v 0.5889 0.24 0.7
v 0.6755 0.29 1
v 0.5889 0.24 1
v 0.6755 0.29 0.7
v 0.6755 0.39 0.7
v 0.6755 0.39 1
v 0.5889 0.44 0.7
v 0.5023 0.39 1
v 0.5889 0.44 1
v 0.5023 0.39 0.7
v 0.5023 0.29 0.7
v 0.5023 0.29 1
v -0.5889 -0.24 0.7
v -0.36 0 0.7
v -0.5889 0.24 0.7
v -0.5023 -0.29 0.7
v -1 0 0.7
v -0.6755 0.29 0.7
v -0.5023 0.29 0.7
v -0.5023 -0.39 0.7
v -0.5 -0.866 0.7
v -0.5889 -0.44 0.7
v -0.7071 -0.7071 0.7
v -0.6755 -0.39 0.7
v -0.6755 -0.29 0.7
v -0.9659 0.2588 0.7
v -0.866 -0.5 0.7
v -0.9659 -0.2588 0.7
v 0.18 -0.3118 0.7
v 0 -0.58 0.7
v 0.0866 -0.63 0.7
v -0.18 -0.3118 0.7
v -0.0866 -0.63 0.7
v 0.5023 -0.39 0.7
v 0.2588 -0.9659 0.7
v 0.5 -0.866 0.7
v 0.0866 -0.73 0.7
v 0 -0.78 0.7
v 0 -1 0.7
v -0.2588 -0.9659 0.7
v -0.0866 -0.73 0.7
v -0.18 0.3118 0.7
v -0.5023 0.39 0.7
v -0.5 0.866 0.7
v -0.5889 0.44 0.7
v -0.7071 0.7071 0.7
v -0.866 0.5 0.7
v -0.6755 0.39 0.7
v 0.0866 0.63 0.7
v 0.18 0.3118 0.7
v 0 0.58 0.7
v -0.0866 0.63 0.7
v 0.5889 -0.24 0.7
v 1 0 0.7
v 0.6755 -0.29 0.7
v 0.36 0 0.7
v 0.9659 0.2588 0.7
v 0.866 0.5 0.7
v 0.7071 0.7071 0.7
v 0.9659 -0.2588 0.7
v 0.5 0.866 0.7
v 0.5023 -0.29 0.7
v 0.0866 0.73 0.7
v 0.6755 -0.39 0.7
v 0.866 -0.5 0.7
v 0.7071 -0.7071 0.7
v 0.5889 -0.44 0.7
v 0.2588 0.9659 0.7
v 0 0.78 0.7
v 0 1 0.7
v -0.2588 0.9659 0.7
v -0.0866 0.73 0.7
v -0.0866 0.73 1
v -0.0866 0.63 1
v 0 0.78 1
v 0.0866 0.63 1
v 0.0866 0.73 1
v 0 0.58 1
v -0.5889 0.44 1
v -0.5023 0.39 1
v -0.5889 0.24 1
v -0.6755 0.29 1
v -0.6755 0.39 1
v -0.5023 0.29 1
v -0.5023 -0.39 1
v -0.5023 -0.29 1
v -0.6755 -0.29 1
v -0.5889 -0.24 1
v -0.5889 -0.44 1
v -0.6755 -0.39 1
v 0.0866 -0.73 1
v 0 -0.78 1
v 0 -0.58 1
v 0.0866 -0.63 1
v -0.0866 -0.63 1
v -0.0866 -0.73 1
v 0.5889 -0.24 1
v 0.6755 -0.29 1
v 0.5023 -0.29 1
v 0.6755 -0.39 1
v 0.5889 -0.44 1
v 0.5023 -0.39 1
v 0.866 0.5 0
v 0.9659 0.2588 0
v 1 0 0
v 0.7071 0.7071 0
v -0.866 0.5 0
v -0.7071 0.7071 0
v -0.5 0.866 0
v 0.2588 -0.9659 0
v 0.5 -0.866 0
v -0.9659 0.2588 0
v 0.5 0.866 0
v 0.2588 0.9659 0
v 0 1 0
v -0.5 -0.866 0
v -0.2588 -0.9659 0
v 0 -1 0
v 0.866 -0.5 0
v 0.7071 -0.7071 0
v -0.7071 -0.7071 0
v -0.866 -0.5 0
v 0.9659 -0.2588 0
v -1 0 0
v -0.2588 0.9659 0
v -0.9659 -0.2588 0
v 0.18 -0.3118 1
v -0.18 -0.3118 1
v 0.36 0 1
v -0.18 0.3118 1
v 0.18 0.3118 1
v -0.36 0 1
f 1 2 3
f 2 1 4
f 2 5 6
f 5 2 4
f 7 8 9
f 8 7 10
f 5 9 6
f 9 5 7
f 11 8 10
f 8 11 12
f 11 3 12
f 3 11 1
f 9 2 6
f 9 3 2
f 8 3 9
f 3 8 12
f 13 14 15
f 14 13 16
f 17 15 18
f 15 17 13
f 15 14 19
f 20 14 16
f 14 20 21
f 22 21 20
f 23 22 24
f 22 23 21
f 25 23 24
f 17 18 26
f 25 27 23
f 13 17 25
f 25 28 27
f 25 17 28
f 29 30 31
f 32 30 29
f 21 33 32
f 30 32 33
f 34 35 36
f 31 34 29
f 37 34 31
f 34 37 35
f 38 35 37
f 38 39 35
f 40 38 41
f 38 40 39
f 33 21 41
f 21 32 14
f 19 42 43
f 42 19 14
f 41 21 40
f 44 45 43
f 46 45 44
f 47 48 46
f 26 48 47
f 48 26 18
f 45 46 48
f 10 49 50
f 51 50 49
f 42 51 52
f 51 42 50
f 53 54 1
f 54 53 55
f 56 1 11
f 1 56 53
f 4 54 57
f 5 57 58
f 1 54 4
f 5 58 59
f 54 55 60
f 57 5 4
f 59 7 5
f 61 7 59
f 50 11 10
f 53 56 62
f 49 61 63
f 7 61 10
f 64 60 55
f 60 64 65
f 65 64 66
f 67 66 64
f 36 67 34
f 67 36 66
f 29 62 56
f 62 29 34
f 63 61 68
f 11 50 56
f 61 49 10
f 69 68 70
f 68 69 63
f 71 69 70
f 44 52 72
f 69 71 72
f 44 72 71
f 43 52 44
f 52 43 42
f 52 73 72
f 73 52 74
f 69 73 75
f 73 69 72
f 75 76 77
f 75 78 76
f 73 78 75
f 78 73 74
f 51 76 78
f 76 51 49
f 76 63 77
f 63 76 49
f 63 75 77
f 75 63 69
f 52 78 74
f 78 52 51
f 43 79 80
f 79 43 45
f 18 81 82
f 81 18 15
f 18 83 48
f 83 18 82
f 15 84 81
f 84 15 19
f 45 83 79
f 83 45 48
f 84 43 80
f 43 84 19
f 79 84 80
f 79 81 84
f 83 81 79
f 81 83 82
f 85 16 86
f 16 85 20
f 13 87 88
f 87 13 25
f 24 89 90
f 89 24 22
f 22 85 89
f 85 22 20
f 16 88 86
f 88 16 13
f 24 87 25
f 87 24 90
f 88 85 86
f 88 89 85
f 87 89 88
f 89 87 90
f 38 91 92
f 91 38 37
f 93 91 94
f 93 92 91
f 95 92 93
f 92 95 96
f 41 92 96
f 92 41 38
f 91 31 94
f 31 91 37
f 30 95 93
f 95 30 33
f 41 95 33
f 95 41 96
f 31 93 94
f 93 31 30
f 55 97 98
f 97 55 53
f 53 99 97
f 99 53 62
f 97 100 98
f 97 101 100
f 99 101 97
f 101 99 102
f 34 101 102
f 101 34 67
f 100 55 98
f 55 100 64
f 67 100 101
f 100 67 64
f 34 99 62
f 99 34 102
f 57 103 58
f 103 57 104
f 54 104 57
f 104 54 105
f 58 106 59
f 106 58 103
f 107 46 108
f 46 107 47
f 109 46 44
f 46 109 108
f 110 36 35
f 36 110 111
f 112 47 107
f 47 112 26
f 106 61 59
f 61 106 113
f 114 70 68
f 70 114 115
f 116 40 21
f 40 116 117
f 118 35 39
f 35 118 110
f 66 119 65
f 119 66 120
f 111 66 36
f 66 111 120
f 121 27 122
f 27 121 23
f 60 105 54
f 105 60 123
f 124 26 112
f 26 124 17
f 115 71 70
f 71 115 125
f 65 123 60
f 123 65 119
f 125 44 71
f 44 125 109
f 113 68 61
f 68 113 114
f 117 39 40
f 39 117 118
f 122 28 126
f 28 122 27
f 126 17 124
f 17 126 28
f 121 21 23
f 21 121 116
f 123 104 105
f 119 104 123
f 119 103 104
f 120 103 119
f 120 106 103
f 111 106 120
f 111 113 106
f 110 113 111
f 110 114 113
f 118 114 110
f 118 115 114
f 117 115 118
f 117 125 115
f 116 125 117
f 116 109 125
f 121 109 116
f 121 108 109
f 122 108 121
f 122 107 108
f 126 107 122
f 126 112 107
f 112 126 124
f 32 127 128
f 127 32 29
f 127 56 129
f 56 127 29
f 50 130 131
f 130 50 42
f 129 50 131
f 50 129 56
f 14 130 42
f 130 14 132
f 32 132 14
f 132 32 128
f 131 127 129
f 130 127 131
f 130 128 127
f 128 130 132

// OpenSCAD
// Carousel Autoloader 0.2.23 - drum end-plate hub (naaf) on unit radius; z from 0 (inside) to 1 (outer face).
// The hub disc fills the plate centre up to z = 0.7 (flush with the holed plate), six bolt heads and the
// axle nut stand proud up to z = 1. The C# geometry scales x/y by the hub radius and z by the plate thickness.
cylinder(r = 1, h = 0.7, $fn = 24);
for (i = [0:5]) rotate([0, 0, 30 + 60 * i]) translate([0.68, 0, 0.7]) cylinder(r = 0.1, h = 0.3, $fn = 6);
translate([0, 0, 0.7]) cylinder(r = 0.36, h = 0.3, $fn = 6);
